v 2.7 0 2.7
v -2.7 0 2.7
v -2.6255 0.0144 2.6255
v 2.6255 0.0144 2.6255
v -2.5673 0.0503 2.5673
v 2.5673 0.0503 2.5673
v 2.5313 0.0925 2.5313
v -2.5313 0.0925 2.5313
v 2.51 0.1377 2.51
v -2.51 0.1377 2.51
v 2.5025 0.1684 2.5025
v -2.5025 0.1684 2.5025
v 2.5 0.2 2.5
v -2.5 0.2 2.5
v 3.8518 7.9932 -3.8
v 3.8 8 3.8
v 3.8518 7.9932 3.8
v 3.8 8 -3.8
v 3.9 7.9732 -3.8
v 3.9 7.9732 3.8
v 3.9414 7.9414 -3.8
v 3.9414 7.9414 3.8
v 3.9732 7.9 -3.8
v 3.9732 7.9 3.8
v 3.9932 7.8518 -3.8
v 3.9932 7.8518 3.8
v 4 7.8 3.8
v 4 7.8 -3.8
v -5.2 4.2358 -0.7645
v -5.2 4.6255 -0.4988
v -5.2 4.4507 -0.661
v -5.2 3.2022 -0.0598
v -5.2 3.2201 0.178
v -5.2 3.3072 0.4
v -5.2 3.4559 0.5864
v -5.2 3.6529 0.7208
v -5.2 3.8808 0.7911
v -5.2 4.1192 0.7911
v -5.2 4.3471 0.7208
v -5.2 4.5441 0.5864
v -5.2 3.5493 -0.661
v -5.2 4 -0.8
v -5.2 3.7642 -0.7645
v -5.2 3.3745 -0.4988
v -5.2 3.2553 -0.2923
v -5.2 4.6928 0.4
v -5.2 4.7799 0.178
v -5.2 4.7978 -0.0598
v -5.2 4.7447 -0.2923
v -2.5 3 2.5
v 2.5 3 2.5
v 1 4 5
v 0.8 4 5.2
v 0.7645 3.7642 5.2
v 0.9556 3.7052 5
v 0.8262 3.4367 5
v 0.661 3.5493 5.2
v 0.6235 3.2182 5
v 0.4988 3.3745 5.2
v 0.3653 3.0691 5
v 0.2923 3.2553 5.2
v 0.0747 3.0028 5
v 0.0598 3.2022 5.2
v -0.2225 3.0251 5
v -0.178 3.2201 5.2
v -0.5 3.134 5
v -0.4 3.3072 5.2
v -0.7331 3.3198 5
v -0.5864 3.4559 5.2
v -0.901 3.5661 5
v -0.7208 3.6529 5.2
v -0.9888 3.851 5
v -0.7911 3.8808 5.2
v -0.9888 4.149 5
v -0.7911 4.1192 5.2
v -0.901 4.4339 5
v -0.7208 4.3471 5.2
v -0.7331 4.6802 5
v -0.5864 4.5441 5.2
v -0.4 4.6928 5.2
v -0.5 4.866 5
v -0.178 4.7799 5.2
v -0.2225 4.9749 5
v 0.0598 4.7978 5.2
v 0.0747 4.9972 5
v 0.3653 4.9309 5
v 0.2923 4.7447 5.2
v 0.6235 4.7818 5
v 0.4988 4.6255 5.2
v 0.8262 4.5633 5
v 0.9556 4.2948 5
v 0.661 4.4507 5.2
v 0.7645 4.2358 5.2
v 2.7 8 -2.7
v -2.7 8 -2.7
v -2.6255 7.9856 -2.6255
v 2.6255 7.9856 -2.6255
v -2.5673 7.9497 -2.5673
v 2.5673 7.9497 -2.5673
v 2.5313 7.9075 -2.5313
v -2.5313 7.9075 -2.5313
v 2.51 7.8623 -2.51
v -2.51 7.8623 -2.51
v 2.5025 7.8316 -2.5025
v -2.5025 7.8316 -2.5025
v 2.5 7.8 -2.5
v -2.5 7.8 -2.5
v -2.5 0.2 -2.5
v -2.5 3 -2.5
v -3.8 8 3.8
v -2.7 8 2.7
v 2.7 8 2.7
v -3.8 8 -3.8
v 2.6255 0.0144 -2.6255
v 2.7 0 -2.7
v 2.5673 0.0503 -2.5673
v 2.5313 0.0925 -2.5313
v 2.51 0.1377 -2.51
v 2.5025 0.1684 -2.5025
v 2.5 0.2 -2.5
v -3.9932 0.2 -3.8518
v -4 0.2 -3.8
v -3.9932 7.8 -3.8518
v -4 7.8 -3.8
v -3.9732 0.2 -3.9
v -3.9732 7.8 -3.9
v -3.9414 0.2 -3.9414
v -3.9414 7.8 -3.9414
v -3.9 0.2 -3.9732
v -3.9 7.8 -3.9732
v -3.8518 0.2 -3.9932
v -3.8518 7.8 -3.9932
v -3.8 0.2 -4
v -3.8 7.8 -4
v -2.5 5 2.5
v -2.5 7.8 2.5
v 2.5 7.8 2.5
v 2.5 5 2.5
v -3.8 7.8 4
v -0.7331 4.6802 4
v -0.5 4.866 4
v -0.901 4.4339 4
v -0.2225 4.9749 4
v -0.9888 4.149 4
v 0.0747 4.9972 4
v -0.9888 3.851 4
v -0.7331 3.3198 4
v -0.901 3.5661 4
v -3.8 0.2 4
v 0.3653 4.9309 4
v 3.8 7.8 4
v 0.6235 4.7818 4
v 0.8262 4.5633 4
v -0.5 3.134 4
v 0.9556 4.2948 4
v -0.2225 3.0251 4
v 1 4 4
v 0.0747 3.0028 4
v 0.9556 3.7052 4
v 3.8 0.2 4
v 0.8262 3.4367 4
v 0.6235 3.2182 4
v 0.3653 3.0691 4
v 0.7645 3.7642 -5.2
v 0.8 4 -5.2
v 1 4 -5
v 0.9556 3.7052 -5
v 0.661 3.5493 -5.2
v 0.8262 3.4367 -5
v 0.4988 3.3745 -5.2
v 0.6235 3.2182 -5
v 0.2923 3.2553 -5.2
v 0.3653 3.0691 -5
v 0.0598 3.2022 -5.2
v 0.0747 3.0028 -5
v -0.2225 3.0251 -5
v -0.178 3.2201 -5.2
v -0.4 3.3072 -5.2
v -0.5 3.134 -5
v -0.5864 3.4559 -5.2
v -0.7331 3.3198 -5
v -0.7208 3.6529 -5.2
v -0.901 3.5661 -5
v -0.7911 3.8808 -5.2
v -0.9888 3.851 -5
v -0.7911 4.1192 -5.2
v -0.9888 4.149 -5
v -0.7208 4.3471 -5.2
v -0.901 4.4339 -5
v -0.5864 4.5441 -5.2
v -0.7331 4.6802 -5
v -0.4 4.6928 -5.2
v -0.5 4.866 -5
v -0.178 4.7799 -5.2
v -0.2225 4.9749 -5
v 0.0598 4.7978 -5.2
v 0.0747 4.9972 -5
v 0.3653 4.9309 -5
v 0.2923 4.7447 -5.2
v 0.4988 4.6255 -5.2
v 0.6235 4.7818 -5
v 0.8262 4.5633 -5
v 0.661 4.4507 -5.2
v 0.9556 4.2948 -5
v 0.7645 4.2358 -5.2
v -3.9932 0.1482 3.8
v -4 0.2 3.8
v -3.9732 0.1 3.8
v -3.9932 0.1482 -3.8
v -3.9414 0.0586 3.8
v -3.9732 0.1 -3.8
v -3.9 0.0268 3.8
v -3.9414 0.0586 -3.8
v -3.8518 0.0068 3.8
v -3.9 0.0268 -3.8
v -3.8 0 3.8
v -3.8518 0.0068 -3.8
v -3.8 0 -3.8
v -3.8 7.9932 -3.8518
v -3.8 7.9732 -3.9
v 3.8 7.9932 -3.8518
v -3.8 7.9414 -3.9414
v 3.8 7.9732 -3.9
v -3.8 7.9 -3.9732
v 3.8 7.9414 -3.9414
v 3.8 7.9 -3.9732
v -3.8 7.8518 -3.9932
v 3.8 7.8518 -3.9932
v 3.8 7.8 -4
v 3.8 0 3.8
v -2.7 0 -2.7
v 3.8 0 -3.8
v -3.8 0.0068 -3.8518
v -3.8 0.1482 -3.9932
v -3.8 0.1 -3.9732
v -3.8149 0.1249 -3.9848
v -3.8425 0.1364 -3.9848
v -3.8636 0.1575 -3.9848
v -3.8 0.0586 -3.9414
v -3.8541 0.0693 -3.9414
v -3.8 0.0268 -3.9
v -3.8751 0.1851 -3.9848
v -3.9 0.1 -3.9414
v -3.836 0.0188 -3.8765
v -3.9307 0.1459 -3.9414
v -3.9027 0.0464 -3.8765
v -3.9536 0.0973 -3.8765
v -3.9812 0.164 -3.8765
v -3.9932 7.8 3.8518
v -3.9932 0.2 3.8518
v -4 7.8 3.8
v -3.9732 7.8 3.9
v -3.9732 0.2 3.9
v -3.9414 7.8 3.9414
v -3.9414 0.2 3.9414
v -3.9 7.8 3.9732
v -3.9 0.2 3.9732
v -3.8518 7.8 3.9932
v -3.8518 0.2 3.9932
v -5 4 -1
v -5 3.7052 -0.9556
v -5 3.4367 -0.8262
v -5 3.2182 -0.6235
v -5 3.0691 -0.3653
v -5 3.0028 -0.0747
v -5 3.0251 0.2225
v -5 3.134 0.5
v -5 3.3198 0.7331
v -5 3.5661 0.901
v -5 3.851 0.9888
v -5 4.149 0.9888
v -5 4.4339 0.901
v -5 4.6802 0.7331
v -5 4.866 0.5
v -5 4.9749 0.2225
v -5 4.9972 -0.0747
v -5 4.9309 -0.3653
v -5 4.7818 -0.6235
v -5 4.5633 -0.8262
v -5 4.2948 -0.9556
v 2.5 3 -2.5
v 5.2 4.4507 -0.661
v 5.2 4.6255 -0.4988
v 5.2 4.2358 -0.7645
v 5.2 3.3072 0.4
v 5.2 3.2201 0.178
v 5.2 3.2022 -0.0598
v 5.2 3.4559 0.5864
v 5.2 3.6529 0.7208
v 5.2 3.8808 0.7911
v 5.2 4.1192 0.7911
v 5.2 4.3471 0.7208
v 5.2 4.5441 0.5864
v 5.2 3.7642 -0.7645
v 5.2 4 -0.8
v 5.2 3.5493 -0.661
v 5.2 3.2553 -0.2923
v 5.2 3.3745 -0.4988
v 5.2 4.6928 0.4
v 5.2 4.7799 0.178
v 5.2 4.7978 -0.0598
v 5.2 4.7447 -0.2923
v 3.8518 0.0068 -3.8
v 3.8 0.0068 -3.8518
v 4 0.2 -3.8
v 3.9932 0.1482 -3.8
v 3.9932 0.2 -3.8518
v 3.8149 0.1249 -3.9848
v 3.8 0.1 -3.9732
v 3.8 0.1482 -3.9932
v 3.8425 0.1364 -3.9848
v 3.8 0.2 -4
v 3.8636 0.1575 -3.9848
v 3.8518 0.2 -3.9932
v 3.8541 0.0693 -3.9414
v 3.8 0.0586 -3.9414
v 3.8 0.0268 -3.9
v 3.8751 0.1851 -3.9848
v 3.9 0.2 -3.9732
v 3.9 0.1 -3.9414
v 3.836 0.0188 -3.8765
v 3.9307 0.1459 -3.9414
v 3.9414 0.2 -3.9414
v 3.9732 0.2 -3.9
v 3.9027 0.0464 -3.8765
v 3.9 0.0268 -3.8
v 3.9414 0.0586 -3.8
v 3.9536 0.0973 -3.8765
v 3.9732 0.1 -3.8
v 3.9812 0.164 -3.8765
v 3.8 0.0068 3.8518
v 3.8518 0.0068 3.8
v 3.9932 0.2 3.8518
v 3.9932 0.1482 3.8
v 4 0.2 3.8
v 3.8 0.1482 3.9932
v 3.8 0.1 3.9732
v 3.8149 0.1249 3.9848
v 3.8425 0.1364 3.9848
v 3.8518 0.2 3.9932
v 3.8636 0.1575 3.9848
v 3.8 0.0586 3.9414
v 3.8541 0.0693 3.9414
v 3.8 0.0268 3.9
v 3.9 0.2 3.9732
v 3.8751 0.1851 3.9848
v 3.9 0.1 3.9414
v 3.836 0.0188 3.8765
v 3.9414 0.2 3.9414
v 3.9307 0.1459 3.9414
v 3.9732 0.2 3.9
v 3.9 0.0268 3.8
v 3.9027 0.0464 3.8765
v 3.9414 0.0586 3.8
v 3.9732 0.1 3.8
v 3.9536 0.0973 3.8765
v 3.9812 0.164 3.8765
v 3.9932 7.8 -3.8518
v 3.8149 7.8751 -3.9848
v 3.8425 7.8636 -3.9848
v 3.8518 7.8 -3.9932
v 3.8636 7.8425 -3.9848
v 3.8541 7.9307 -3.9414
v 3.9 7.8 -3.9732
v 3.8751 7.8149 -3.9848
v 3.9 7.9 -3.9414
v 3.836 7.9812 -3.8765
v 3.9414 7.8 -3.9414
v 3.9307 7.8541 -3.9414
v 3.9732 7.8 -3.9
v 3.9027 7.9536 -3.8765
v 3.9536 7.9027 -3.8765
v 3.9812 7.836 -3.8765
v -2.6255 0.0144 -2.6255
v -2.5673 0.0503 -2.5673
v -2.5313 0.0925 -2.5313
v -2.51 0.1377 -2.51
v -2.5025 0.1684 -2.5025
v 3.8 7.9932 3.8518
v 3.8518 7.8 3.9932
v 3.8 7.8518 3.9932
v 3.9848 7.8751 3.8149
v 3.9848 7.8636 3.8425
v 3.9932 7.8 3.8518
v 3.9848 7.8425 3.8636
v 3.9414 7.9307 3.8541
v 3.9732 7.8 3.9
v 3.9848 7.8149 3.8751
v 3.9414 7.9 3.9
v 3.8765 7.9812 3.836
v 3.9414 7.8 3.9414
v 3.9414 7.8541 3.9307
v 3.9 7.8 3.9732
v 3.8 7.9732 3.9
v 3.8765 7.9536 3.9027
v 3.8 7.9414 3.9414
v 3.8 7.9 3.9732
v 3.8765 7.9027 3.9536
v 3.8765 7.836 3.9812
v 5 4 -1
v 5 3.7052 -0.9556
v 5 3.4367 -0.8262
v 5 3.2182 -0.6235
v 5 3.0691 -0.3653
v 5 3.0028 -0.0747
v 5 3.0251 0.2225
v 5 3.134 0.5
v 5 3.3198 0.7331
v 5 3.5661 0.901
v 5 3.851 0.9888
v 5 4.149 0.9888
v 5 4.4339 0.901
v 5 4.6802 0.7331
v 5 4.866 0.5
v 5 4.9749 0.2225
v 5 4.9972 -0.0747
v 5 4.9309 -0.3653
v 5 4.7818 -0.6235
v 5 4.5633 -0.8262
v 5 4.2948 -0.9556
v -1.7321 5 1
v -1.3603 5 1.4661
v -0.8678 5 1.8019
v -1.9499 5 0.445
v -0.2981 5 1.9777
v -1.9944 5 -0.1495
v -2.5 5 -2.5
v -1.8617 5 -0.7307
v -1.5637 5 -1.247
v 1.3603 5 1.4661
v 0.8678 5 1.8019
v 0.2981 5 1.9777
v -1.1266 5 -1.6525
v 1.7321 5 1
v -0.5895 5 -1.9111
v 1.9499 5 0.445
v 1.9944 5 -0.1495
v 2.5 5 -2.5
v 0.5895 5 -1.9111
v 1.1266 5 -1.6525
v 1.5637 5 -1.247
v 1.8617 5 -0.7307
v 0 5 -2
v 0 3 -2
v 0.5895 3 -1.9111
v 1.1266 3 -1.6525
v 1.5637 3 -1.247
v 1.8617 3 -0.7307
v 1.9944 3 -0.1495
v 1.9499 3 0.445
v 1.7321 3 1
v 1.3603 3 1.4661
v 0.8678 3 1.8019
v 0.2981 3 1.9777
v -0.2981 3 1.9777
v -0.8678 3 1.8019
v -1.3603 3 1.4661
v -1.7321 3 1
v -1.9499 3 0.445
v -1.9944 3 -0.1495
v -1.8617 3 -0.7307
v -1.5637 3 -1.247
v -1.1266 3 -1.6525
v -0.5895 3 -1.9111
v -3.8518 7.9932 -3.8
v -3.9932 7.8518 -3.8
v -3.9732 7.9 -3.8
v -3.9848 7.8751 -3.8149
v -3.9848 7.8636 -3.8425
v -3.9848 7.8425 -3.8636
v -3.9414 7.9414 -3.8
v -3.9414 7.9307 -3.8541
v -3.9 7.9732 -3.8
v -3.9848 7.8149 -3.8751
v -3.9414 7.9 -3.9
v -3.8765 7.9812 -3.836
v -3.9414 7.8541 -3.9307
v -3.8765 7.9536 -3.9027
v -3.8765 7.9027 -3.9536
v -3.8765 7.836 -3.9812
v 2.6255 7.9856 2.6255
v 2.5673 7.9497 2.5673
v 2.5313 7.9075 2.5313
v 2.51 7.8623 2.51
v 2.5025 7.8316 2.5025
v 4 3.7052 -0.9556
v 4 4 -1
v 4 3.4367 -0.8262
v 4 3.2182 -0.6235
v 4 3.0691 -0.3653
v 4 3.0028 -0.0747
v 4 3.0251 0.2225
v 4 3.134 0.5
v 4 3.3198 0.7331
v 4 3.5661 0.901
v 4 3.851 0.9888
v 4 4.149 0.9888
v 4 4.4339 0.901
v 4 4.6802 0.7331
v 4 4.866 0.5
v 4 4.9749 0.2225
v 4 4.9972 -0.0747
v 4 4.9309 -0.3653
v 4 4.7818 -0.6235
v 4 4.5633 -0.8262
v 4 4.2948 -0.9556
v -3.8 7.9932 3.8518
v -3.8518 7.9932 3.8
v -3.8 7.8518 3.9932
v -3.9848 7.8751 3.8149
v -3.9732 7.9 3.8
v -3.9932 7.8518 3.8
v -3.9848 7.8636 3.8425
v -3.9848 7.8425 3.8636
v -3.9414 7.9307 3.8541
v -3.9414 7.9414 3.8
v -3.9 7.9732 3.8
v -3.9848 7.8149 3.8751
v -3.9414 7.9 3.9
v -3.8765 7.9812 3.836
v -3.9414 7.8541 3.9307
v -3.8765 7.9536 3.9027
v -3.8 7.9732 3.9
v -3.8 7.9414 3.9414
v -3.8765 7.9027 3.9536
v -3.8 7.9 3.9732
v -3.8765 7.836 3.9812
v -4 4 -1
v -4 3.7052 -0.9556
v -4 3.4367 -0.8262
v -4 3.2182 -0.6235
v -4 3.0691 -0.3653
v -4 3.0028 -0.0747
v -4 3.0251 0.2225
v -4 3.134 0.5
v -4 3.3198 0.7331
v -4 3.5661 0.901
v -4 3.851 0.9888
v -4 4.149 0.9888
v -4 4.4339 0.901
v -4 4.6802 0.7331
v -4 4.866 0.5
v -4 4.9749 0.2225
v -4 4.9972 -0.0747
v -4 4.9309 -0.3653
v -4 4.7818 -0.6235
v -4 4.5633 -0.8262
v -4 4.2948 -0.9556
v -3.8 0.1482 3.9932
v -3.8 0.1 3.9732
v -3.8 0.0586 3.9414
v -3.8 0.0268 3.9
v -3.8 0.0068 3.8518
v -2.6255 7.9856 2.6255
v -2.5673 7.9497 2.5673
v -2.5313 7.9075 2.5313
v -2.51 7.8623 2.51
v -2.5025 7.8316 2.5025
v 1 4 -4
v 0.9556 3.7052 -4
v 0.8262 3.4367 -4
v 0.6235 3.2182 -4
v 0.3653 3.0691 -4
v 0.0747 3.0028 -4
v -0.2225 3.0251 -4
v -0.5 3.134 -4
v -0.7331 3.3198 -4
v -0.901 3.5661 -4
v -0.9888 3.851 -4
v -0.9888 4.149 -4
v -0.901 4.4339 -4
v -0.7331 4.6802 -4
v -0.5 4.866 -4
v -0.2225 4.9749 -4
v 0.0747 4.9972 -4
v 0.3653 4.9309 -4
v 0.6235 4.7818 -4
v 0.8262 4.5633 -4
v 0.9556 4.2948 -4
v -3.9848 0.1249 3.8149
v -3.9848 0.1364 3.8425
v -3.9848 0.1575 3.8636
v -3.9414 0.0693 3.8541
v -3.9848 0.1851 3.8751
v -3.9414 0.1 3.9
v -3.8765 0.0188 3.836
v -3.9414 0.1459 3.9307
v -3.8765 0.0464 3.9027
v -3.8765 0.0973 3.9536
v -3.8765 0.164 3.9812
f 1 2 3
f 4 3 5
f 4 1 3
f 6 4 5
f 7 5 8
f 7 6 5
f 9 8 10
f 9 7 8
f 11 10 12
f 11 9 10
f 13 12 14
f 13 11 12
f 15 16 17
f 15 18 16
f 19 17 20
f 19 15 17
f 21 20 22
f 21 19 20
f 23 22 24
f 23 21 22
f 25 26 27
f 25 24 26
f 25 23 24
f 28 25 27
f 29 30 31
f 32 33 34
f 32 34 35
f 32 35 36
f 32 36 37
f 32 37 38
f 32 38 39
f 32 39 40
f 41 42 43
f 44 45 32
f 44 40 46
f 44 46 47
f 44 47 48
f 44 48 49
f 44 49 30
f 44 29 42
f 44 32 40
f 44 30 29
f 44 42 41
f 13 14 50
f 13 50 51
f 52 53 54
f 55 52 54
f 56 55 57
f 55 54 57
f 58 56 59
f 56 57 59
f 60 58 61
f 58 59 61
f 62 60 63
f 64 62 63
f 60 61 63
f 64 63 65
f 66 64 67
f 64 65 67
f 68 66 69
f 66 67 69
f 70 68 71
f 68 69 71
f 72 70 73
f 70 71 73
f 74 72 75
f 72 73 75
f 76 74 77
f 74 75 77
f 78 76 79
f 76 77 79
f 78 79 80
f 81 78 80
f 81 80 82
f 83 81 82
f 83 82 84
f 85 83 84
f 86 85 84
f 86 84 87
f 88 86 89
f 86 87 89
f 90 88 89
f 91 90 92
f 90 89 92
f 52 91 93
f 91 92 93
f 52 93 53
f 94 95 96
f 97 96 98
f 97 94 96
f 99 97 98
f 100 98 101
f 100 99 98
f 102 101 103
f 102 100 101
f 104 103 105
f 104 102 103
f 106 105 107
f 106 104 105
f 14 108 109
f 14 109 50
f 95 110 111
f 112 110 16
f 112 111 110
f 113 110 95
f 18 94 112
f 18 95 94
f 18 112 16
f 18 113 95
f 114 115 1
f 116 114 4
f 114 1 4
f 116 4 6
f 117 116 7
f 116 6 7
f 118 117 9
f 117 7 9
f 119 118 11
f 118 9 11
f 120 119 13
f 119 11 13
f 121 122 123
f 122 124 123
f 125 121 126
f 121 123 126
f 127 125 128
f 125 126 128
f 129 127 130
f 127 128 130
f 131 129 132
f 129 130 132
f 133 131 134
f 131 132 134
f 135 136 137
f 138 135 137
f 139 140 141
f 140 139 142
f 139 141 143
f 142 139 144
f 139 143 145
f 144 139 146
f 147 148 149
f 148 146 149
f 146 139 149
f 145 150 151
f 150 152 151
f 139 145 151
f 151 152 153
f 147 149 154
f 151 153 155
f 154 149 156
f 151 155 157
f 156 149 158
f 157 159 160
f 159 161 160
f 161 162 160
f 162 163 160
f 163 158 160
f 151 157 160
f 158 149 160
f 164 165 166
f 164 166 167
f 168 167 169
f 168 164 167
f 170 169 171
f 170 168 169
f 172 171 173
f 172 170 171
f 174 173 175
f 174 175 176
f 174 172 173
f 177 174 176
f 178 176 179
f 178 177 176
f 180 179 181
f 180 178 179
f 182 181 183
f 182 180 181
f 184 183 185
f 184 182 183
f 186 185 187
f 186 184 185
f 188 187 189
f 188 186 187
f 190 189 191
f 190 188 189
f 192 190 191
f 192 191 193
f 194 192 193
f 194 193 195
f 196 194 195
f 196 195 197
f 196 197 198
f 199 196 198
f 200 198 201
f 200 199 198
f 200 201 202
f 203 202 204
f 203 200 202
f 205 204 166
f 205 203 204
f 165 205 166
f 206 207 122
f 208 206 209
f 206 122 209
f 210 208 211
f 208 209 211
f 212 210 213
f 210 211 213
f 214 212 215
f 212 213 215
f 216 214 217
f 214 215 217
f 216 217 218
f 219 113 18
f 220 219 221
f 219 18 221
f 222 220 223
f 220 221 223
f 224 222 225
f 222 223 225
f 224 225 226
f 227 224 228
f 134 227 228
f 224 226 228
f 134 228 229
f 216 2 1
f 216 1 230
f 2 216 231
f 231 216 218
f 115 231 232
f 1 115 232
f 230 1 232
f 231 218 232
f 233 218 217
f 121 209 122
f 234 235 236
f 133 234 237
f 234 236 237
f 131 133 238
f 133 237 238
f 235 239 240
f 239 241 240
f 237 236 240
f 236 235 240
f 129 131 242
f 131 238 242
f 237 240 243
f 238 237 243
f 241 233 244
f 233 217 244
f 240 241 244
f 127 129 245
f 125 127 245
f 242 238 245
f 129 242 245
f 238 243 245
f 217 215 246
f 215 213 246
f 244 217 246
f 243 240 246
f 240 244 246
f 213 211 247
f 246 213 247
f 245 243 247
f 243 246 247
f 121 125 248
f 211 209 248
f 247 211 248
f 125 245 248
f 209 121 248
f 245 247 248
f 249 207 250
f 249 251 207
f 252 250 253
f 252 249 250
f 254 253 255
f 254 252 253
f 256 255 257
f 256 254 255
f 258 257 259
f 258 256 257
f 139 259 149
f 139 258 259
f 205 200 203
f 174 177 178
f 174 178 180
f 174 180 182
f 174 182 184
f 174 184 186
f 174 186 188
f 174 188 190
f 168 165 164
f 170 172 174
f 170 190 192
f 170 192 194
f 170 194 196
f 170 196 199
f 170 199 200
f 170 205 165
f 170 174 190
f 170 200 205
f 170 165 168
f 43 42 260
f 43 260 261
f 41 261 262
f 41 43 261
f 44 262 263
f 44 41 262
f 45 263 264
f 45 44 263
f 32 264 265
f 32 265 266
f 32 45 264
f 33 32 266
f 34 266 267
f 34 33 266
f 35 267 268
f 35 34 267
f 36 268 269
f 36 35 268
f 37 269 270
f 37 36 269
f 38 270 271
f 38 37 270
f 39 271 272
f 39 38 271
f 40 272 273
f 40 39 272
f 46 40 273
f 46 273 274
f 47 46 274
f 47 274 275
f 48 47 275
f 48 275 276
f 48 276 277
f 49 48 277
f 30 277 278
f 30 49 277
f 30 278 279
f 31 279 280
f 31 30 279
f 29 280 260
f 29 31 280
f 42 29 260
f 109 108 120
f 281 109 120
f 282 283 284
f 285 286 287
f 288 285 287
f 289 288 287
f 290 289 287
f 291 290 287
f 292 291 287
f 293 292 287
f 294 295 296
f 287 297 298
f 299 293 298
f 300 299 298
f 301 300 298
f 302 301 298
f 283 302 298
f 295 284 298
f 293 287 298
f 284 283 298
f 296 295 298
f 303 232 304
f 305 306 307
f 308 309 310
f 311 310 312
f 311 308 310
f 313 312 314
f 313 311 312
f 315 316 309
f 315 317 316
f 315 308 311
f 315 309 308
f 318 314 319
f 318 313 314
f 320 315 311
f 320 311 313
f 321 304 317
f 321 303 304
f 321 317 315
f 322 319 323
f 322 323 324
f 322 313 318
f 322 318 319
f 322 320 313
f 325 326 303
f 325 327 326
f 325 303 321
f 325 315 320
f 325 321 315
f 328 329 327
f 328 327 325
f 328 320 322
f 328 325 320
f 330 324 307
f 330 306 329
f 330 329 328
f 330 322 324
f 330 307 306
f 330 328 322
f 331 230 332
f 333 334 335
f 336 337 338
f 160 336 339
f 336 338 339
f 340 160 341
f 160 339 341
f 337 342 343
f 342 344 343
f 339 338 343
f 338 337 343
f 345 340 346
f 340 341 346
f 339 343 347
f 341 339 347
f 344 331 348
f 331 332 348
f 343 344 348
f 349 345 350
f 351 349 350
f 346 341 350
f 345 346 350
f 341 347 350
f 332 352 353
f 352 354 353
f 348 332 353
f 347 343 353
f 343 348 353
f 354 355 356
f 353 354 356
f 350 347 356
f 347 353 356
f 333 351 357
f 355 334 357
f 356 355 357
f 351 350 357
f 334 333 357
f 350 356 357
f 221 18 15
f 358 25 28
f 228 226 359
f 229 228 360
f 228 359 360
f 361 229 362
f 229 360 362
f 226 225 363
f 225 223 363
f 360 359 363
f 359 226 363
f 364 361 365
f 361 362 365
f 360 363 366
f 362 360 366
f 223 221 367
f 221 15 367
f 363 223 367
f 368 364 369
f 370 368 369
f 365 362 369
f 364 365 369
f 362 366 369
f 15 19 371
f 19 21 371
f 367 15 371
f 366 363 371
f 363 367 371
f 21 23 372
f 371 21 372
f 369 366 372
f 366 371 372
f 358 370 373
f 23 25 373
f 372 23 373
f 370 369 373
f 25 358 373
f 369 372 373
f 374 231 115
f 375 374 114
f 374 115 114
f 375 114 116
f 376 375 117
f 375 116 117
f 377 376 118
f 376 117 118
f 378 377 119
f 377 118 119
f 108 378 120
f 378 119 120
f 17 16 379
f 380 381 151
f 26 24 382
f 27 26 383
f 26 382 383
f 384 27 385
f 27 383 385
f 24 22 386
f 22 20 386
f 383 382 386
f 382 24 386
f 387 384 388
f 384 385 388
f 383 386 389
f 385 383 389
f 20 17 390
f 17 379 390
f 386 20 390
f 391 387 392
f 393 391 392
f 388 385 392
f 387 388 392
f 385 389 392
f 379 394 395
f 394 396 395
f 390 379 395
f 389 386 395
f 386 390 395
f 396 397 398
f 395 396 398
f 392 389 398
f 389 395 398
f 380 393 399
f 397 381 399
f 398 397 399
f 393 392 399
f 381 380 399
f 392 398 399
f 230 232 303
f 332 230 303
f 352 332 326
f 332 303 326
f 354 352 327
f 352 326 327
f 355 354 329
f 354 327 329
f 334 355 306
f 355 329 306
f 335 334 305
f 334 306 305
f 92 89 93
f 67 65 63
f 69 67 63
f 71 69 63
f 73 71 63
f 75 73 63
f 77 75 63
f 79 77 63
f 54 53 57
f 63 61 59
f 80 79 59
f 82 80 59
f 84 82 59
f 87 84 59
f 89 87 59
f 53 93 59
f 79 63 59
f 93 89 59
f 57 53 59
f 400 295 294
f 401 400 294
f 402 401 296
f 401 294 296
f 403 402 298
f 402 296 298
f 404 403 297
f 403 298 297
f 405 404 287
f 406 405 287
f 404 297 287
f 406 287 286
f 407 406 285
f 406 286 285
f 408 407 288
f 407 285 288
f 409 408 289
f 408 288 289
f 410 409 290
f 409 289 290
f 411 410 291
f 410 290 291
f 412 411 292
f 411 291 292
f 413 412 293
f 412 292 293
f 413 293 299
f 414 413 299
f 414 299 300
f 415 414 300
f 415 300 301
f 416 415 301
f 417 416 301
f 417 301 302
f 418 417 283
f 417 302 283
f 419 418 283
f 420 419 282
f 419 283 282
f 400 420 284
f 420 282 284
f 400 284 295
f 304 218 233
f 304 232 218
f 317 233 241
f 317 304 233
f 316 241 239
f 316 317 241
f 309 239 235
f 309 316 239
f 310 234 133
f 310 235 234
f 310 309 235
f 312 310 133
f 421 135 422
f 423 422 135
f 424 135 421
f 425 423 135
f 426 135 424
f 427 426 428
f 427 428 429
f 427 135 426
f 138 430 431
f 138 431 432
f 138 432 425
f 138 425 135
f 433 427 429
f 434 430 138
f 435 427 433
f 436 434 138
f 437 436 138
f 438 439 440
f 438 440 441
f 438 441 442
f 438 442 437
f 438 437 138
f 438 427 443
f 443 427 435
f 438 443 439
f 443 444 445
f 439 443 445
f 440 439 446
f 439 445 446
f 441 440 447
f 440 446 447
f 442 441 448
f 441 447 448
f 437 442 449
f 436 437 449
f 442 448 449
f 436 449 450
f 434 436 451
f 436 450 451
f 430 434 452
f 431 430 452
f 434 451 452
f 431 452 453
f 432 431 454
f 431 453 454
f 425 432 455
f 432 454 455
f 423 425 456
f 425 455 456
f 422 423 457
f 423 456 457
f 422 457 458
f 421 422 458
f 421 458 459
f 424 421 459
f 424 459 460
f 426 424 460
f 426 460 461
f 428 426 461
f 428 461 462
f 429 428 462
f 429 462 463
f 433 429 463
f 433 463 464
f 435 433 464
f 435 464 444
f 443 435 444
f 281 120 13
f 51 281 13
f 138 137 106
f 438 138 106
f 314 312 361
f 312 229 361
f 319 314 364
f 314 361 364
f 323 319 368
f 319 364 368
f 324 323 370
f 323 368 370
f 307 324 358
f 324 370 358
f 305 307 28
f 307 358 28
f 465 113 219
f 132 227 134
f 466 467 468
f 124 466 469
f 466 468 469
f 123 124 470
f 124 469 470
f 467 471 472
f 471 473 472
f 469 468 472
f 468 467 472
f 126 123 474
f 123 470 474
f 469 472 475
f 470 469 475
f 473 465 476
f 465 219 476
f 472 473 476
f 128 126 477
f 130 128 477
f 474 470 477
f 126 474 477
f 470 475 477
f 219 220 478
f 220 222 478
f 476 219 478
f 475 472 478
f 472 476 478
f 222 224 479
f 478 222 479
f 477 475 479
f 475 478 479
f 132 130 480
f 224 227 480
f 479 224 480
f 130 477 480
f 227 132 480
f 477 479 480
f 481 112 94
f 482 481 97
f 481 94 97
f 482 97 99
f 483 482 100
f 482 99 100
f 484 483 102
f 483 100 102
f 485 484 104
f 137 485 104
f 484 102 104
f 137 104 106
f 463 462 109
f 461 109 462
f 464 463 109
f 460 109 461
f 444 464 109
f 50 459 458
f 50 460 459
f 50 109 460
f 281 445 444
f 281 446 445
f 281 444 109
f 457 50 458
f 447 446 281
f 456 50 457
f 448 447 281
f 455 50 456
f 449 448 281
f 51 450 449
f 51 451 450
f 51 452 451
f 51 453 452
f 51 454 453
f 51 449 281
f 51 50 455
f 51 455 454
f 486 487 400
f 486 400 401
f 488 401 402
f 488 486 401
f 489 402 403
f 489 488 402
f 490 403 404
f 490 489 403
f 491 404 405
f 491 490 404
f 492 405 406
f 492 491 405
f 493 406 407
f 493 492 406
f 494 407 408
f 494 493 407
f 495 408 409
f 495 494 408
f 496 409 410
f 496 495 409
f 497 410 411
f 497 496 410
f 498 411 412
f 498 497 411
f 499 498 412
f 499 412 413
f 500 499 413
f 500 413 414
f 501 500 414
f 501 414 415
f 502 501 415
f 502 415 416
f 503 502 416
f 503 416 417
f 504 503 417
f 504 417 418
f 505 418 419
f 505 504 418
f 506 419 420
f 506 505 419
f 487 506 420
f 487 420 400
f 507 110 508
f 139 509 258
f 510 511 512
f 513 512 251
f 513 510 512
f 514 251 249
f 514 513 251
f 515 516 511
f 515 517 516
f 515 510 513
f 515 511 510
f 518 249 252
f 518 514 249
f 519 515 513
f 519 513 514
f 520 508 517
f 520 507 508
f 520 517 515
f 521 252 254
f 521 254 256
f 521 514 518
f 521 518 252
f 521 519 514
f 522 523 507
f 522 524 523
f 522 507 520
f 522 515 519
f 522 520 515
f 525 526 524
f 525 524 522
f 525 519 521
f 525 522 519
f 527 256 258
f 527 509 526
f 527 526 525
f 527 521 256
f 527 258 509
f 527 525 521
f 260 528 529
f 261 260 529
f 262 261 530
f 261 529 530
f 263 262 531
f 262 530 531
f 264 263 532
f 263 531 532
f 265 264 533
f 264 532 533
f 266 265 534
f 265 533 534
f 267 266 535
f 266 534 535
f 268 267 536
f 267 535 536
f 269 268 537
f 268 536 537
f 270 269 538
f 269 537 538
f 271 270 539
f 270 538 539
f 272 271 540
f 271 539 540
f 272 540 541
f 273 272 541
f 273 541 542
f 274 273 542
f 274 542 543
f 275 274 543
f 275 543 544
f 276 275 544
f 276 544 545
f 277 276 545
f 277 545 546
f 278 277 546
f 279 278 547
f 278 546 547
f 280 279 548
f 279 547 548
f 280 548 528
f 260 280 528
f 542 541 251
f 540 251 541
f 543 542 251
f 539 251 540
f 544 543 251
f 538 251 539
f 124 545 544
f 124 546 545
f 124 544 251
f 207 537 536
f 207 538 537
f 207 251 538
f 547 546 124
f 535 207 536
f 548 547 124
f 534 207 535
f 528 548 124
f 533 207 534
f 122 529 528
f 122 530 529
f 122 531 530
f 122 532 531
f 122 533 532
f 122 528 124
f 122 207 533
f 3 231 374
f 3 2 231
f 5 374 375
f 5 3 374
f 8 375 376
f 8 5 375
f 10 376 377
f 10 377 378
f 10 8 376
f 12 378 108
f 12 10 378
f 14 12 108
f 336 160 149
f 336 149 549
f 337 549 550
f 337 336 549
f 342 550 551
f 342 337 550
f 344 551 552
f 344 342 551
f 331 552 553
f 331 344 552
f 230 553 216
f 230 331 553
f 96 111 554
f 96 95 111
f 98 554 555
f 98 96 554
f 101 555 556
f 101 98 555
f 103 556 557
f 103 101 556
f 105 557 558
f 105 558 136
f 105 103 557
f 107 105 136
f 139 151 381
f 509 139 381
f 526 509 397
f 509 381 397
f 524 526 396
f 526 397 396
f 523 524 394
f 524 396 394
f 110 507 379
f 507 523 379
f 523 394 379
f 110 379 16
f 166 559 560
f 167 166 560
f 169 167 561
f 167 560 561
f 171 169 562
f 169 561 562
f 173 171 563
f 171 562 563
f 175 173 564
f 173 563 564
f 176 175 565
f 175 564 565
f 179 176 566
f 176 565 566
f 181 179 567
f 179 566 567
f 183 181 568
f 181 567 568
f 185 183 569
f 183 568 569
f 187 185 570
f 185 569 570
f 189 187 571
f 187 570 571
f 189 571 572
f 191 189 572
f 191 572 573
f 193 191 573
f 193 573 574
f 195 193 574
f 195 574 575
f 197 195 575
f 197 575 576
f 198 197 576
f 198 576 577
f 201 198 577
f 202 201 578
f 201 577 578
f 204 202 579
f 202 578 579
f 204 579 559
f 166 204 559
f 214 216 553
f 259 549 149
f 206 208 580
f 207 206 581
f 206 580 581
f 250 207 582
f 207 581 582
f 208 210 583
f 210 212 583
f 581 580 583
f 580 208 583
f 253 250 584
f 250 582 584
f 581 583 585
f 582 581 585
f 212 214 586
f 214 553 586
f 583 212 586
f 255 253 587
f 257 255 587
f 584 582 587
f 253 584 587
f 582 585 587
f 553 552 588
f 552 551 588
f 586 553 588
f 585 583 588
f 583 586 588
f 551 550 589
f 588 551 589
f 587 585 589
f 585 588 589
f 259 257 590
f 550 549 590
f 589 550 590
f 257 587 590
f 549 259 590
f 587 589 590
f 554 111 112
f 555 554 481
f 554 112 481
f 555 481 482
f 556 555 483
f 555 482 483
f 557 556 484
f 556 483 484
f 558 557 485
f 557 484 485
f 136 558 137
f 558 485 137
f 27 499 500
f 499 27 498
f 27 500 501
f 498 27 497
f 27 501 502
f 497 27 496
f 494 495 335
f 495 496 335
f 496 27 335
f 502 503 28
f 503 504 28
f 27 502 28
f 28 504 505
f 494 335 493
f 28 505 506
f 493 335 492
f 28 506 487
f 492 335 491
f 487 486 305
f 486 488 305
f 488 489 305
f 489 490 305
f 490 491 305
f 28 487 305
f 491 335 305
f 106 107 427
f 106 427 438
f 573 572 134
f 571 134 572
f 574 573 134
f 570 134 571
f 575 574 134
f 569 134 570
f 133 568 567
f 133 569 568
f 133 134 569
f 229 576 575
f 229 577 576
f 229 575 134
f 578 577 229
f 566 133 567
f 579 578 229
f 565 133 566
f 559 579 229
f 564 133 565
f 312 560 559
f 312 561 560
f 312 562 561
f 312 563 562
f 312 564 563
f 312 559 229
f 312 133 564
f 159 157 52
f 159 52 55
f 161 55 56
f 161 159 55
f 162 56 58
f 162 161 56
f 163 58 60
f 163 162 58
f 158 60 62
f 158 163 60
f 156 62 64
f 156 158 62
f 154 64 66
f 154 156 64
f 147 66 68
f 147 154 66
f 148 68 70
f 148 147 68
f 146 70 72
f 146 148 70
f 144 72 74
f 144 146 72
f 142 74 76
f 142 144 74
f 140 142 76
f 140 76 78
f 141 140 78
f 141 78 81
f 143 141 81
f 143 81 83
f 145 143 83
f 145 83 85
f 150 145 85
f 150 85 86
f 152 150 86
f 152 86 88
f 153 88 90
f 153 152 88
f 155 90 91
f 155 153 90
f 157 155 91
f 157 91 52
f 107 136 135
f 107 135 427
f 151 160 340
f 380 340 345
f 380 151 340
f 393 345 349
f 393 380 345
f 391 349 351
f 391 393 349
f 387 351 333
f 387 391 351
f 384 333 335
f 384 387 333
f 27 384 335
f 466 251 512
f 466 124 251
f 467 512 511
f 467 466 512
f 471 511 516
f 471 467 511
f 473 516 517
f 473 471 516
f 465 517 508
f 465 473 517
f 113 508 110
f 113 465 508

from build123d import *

# Parameters (mm, degrees)
SKETCH_1_W          = 8
SKETCH_1_H          = 8
EXTRUDE_1_DEPTH     = 8
SKETCH_2_W          = 5
SKETCH_2_H          = 5
CUT_EXTRUDE_1_DEPTH = 3
SKETCH_3_W          = 5
SKETCH_3_H          = 5
CUT_EXTRUDE_2_DEPTH = 3
CUT_EXTRUDE_3_REACH = 9.55
SKETCH_4_R          = 2
SKETCH_5_R          = 1
EXTRUDE_2_DEPTH     = 1.2
SKETCH_6_R          = 1
EXTRUDE_3_DEPTH     = 1.2
CHAMFER_1_SIZE      = 0.2
FILLET_1_R          = 0.2


with BuildPart() as part:
    # 草图1 → 凸台-拉伸1 (new body)
    with BuildSketch(Plane(origin=(0, 0, 0), x_dir=(1, 0, 0), z_dir=(0, 1, 0))):
        Rectangle(SKETCH_1_W, SKETCH_1_H)
    extrude(amount=EXTRUDE_1_DEPTH)

    # 草图2 → 切除-拉伸1 (cut)
    with BuildSketch(Plane(origin=(0, 8, 0), x_dir=(1, 0, 0), z_dir=(0, 1, 0))):
        Rectangle(SKETCH_2_W, SKETCH_2_H)
    extrude(amount=-CUT_EXTRUDE_1_DEPTH, mode=Mode.SUBTRACT)

    # 草图3 → 切除-拉伸2 (cut)
    with BuildSketch(Plane.XZ):
        Rectangle(SKETCH_3_W, SKETCH_3_H)
    extrude(amount=-CUT_EXTRUDE_2_DEPTH, mode=Mode.SUBTRACT)

    # 草图4 → 切除-拉伸3 (cut, up to next)
    with BuildSketch(Plane.XZ.offset(-3), mode=Mode.PRIVATE) as cut_extrude_3_sk1:
        with Locations(Location((0, 0, 0), (0, 0, 270))):
            Circle(SKETCH_4_R)
    cut_extrude_3_tool1 = extrude(cut_extrude_3_sk1.sketch, amount=-CUT_EXTRUDE_3_REACH, mode=Mode.PRIVATE) & part.part
    add(cut_extrude_3_tool1.solids().sort_by_distance((0, 3, 0))[0], mode=Mode.SUBTRACT)

    # 草图5 → 凸台-拉伸2 (add)
    with BuildSketch(Plane.ZY.offset(4)):
        with Locations(Location((0, 4, 0), (0, 0, 180))):
            Circle(SKETCH_5_R)
    extrude_2 = extrude(amount=EXTRUDE_2_DEPTH)

    # 镜向1: 凸台-拉伸2 across plane
    add(extrude_2.mirror(Plane(origin=(0, 0, 0), x_dir=(0, 0, 1), z_dir=(1, 0, 0))))

    # 草图6 → 凸台-拉伸3 (add)
    with BuildSketch(Plane(origin=(0, 0, -4), x_dir=(-1, 0, 0), z_dir=(0, 0, -1))):
        with Locations(Location((0, 4, 0), (0, 0, 180))):
            Circle(SKETCH_6_R)
    extrude_3 = extrude(amount=EXTRUDE_3_DEPTH)

    # 镜向2: 凸台-拉伸3 across plane
    add(extrude_3.mirror(Plane.XY))

    # 倒角1
    chamfer_1_edges = [part.edges().sort_by_distance(p)[0] for p in [
        (-5.2, 4, 1),
        (5.2, 4, 1),
        (-1, 4, -5.2),
        (-1, 4, 5.2),
    ]]
    chamfer(chamfer_1_edges, length=CHAMFER_1_SIZE)

    # 圆角1
    fillet_1_edges = [part.edges().sort_by_distance(p)[0] for p in [
        (0, 8, 4),
        (4, 8, 0),
        (2.5, 8, 0),
        (0, 8, -2.5),
        (-2.5, 8, 0),
        (0, 8, 2.5),
        (-2.5, 0, 0),
        (0, 0, -2.5),
        (2.5, 0, 0),
        (0, 0, 2.5),
        (0, 8, -4),
        (4, 0, 0),
        (0, 0, 4),
        (-4, 0, 0),
        (0, 0, -4),
        (-4, 8, 0),
        (4, 4, -4),
        (4, 4, 4),
        (-4, 4, 4),
        (-4, 4, -4),
    ]]
    fillet(fillet_1_edges, radius=FILLET_1_R)


solid = part.part
